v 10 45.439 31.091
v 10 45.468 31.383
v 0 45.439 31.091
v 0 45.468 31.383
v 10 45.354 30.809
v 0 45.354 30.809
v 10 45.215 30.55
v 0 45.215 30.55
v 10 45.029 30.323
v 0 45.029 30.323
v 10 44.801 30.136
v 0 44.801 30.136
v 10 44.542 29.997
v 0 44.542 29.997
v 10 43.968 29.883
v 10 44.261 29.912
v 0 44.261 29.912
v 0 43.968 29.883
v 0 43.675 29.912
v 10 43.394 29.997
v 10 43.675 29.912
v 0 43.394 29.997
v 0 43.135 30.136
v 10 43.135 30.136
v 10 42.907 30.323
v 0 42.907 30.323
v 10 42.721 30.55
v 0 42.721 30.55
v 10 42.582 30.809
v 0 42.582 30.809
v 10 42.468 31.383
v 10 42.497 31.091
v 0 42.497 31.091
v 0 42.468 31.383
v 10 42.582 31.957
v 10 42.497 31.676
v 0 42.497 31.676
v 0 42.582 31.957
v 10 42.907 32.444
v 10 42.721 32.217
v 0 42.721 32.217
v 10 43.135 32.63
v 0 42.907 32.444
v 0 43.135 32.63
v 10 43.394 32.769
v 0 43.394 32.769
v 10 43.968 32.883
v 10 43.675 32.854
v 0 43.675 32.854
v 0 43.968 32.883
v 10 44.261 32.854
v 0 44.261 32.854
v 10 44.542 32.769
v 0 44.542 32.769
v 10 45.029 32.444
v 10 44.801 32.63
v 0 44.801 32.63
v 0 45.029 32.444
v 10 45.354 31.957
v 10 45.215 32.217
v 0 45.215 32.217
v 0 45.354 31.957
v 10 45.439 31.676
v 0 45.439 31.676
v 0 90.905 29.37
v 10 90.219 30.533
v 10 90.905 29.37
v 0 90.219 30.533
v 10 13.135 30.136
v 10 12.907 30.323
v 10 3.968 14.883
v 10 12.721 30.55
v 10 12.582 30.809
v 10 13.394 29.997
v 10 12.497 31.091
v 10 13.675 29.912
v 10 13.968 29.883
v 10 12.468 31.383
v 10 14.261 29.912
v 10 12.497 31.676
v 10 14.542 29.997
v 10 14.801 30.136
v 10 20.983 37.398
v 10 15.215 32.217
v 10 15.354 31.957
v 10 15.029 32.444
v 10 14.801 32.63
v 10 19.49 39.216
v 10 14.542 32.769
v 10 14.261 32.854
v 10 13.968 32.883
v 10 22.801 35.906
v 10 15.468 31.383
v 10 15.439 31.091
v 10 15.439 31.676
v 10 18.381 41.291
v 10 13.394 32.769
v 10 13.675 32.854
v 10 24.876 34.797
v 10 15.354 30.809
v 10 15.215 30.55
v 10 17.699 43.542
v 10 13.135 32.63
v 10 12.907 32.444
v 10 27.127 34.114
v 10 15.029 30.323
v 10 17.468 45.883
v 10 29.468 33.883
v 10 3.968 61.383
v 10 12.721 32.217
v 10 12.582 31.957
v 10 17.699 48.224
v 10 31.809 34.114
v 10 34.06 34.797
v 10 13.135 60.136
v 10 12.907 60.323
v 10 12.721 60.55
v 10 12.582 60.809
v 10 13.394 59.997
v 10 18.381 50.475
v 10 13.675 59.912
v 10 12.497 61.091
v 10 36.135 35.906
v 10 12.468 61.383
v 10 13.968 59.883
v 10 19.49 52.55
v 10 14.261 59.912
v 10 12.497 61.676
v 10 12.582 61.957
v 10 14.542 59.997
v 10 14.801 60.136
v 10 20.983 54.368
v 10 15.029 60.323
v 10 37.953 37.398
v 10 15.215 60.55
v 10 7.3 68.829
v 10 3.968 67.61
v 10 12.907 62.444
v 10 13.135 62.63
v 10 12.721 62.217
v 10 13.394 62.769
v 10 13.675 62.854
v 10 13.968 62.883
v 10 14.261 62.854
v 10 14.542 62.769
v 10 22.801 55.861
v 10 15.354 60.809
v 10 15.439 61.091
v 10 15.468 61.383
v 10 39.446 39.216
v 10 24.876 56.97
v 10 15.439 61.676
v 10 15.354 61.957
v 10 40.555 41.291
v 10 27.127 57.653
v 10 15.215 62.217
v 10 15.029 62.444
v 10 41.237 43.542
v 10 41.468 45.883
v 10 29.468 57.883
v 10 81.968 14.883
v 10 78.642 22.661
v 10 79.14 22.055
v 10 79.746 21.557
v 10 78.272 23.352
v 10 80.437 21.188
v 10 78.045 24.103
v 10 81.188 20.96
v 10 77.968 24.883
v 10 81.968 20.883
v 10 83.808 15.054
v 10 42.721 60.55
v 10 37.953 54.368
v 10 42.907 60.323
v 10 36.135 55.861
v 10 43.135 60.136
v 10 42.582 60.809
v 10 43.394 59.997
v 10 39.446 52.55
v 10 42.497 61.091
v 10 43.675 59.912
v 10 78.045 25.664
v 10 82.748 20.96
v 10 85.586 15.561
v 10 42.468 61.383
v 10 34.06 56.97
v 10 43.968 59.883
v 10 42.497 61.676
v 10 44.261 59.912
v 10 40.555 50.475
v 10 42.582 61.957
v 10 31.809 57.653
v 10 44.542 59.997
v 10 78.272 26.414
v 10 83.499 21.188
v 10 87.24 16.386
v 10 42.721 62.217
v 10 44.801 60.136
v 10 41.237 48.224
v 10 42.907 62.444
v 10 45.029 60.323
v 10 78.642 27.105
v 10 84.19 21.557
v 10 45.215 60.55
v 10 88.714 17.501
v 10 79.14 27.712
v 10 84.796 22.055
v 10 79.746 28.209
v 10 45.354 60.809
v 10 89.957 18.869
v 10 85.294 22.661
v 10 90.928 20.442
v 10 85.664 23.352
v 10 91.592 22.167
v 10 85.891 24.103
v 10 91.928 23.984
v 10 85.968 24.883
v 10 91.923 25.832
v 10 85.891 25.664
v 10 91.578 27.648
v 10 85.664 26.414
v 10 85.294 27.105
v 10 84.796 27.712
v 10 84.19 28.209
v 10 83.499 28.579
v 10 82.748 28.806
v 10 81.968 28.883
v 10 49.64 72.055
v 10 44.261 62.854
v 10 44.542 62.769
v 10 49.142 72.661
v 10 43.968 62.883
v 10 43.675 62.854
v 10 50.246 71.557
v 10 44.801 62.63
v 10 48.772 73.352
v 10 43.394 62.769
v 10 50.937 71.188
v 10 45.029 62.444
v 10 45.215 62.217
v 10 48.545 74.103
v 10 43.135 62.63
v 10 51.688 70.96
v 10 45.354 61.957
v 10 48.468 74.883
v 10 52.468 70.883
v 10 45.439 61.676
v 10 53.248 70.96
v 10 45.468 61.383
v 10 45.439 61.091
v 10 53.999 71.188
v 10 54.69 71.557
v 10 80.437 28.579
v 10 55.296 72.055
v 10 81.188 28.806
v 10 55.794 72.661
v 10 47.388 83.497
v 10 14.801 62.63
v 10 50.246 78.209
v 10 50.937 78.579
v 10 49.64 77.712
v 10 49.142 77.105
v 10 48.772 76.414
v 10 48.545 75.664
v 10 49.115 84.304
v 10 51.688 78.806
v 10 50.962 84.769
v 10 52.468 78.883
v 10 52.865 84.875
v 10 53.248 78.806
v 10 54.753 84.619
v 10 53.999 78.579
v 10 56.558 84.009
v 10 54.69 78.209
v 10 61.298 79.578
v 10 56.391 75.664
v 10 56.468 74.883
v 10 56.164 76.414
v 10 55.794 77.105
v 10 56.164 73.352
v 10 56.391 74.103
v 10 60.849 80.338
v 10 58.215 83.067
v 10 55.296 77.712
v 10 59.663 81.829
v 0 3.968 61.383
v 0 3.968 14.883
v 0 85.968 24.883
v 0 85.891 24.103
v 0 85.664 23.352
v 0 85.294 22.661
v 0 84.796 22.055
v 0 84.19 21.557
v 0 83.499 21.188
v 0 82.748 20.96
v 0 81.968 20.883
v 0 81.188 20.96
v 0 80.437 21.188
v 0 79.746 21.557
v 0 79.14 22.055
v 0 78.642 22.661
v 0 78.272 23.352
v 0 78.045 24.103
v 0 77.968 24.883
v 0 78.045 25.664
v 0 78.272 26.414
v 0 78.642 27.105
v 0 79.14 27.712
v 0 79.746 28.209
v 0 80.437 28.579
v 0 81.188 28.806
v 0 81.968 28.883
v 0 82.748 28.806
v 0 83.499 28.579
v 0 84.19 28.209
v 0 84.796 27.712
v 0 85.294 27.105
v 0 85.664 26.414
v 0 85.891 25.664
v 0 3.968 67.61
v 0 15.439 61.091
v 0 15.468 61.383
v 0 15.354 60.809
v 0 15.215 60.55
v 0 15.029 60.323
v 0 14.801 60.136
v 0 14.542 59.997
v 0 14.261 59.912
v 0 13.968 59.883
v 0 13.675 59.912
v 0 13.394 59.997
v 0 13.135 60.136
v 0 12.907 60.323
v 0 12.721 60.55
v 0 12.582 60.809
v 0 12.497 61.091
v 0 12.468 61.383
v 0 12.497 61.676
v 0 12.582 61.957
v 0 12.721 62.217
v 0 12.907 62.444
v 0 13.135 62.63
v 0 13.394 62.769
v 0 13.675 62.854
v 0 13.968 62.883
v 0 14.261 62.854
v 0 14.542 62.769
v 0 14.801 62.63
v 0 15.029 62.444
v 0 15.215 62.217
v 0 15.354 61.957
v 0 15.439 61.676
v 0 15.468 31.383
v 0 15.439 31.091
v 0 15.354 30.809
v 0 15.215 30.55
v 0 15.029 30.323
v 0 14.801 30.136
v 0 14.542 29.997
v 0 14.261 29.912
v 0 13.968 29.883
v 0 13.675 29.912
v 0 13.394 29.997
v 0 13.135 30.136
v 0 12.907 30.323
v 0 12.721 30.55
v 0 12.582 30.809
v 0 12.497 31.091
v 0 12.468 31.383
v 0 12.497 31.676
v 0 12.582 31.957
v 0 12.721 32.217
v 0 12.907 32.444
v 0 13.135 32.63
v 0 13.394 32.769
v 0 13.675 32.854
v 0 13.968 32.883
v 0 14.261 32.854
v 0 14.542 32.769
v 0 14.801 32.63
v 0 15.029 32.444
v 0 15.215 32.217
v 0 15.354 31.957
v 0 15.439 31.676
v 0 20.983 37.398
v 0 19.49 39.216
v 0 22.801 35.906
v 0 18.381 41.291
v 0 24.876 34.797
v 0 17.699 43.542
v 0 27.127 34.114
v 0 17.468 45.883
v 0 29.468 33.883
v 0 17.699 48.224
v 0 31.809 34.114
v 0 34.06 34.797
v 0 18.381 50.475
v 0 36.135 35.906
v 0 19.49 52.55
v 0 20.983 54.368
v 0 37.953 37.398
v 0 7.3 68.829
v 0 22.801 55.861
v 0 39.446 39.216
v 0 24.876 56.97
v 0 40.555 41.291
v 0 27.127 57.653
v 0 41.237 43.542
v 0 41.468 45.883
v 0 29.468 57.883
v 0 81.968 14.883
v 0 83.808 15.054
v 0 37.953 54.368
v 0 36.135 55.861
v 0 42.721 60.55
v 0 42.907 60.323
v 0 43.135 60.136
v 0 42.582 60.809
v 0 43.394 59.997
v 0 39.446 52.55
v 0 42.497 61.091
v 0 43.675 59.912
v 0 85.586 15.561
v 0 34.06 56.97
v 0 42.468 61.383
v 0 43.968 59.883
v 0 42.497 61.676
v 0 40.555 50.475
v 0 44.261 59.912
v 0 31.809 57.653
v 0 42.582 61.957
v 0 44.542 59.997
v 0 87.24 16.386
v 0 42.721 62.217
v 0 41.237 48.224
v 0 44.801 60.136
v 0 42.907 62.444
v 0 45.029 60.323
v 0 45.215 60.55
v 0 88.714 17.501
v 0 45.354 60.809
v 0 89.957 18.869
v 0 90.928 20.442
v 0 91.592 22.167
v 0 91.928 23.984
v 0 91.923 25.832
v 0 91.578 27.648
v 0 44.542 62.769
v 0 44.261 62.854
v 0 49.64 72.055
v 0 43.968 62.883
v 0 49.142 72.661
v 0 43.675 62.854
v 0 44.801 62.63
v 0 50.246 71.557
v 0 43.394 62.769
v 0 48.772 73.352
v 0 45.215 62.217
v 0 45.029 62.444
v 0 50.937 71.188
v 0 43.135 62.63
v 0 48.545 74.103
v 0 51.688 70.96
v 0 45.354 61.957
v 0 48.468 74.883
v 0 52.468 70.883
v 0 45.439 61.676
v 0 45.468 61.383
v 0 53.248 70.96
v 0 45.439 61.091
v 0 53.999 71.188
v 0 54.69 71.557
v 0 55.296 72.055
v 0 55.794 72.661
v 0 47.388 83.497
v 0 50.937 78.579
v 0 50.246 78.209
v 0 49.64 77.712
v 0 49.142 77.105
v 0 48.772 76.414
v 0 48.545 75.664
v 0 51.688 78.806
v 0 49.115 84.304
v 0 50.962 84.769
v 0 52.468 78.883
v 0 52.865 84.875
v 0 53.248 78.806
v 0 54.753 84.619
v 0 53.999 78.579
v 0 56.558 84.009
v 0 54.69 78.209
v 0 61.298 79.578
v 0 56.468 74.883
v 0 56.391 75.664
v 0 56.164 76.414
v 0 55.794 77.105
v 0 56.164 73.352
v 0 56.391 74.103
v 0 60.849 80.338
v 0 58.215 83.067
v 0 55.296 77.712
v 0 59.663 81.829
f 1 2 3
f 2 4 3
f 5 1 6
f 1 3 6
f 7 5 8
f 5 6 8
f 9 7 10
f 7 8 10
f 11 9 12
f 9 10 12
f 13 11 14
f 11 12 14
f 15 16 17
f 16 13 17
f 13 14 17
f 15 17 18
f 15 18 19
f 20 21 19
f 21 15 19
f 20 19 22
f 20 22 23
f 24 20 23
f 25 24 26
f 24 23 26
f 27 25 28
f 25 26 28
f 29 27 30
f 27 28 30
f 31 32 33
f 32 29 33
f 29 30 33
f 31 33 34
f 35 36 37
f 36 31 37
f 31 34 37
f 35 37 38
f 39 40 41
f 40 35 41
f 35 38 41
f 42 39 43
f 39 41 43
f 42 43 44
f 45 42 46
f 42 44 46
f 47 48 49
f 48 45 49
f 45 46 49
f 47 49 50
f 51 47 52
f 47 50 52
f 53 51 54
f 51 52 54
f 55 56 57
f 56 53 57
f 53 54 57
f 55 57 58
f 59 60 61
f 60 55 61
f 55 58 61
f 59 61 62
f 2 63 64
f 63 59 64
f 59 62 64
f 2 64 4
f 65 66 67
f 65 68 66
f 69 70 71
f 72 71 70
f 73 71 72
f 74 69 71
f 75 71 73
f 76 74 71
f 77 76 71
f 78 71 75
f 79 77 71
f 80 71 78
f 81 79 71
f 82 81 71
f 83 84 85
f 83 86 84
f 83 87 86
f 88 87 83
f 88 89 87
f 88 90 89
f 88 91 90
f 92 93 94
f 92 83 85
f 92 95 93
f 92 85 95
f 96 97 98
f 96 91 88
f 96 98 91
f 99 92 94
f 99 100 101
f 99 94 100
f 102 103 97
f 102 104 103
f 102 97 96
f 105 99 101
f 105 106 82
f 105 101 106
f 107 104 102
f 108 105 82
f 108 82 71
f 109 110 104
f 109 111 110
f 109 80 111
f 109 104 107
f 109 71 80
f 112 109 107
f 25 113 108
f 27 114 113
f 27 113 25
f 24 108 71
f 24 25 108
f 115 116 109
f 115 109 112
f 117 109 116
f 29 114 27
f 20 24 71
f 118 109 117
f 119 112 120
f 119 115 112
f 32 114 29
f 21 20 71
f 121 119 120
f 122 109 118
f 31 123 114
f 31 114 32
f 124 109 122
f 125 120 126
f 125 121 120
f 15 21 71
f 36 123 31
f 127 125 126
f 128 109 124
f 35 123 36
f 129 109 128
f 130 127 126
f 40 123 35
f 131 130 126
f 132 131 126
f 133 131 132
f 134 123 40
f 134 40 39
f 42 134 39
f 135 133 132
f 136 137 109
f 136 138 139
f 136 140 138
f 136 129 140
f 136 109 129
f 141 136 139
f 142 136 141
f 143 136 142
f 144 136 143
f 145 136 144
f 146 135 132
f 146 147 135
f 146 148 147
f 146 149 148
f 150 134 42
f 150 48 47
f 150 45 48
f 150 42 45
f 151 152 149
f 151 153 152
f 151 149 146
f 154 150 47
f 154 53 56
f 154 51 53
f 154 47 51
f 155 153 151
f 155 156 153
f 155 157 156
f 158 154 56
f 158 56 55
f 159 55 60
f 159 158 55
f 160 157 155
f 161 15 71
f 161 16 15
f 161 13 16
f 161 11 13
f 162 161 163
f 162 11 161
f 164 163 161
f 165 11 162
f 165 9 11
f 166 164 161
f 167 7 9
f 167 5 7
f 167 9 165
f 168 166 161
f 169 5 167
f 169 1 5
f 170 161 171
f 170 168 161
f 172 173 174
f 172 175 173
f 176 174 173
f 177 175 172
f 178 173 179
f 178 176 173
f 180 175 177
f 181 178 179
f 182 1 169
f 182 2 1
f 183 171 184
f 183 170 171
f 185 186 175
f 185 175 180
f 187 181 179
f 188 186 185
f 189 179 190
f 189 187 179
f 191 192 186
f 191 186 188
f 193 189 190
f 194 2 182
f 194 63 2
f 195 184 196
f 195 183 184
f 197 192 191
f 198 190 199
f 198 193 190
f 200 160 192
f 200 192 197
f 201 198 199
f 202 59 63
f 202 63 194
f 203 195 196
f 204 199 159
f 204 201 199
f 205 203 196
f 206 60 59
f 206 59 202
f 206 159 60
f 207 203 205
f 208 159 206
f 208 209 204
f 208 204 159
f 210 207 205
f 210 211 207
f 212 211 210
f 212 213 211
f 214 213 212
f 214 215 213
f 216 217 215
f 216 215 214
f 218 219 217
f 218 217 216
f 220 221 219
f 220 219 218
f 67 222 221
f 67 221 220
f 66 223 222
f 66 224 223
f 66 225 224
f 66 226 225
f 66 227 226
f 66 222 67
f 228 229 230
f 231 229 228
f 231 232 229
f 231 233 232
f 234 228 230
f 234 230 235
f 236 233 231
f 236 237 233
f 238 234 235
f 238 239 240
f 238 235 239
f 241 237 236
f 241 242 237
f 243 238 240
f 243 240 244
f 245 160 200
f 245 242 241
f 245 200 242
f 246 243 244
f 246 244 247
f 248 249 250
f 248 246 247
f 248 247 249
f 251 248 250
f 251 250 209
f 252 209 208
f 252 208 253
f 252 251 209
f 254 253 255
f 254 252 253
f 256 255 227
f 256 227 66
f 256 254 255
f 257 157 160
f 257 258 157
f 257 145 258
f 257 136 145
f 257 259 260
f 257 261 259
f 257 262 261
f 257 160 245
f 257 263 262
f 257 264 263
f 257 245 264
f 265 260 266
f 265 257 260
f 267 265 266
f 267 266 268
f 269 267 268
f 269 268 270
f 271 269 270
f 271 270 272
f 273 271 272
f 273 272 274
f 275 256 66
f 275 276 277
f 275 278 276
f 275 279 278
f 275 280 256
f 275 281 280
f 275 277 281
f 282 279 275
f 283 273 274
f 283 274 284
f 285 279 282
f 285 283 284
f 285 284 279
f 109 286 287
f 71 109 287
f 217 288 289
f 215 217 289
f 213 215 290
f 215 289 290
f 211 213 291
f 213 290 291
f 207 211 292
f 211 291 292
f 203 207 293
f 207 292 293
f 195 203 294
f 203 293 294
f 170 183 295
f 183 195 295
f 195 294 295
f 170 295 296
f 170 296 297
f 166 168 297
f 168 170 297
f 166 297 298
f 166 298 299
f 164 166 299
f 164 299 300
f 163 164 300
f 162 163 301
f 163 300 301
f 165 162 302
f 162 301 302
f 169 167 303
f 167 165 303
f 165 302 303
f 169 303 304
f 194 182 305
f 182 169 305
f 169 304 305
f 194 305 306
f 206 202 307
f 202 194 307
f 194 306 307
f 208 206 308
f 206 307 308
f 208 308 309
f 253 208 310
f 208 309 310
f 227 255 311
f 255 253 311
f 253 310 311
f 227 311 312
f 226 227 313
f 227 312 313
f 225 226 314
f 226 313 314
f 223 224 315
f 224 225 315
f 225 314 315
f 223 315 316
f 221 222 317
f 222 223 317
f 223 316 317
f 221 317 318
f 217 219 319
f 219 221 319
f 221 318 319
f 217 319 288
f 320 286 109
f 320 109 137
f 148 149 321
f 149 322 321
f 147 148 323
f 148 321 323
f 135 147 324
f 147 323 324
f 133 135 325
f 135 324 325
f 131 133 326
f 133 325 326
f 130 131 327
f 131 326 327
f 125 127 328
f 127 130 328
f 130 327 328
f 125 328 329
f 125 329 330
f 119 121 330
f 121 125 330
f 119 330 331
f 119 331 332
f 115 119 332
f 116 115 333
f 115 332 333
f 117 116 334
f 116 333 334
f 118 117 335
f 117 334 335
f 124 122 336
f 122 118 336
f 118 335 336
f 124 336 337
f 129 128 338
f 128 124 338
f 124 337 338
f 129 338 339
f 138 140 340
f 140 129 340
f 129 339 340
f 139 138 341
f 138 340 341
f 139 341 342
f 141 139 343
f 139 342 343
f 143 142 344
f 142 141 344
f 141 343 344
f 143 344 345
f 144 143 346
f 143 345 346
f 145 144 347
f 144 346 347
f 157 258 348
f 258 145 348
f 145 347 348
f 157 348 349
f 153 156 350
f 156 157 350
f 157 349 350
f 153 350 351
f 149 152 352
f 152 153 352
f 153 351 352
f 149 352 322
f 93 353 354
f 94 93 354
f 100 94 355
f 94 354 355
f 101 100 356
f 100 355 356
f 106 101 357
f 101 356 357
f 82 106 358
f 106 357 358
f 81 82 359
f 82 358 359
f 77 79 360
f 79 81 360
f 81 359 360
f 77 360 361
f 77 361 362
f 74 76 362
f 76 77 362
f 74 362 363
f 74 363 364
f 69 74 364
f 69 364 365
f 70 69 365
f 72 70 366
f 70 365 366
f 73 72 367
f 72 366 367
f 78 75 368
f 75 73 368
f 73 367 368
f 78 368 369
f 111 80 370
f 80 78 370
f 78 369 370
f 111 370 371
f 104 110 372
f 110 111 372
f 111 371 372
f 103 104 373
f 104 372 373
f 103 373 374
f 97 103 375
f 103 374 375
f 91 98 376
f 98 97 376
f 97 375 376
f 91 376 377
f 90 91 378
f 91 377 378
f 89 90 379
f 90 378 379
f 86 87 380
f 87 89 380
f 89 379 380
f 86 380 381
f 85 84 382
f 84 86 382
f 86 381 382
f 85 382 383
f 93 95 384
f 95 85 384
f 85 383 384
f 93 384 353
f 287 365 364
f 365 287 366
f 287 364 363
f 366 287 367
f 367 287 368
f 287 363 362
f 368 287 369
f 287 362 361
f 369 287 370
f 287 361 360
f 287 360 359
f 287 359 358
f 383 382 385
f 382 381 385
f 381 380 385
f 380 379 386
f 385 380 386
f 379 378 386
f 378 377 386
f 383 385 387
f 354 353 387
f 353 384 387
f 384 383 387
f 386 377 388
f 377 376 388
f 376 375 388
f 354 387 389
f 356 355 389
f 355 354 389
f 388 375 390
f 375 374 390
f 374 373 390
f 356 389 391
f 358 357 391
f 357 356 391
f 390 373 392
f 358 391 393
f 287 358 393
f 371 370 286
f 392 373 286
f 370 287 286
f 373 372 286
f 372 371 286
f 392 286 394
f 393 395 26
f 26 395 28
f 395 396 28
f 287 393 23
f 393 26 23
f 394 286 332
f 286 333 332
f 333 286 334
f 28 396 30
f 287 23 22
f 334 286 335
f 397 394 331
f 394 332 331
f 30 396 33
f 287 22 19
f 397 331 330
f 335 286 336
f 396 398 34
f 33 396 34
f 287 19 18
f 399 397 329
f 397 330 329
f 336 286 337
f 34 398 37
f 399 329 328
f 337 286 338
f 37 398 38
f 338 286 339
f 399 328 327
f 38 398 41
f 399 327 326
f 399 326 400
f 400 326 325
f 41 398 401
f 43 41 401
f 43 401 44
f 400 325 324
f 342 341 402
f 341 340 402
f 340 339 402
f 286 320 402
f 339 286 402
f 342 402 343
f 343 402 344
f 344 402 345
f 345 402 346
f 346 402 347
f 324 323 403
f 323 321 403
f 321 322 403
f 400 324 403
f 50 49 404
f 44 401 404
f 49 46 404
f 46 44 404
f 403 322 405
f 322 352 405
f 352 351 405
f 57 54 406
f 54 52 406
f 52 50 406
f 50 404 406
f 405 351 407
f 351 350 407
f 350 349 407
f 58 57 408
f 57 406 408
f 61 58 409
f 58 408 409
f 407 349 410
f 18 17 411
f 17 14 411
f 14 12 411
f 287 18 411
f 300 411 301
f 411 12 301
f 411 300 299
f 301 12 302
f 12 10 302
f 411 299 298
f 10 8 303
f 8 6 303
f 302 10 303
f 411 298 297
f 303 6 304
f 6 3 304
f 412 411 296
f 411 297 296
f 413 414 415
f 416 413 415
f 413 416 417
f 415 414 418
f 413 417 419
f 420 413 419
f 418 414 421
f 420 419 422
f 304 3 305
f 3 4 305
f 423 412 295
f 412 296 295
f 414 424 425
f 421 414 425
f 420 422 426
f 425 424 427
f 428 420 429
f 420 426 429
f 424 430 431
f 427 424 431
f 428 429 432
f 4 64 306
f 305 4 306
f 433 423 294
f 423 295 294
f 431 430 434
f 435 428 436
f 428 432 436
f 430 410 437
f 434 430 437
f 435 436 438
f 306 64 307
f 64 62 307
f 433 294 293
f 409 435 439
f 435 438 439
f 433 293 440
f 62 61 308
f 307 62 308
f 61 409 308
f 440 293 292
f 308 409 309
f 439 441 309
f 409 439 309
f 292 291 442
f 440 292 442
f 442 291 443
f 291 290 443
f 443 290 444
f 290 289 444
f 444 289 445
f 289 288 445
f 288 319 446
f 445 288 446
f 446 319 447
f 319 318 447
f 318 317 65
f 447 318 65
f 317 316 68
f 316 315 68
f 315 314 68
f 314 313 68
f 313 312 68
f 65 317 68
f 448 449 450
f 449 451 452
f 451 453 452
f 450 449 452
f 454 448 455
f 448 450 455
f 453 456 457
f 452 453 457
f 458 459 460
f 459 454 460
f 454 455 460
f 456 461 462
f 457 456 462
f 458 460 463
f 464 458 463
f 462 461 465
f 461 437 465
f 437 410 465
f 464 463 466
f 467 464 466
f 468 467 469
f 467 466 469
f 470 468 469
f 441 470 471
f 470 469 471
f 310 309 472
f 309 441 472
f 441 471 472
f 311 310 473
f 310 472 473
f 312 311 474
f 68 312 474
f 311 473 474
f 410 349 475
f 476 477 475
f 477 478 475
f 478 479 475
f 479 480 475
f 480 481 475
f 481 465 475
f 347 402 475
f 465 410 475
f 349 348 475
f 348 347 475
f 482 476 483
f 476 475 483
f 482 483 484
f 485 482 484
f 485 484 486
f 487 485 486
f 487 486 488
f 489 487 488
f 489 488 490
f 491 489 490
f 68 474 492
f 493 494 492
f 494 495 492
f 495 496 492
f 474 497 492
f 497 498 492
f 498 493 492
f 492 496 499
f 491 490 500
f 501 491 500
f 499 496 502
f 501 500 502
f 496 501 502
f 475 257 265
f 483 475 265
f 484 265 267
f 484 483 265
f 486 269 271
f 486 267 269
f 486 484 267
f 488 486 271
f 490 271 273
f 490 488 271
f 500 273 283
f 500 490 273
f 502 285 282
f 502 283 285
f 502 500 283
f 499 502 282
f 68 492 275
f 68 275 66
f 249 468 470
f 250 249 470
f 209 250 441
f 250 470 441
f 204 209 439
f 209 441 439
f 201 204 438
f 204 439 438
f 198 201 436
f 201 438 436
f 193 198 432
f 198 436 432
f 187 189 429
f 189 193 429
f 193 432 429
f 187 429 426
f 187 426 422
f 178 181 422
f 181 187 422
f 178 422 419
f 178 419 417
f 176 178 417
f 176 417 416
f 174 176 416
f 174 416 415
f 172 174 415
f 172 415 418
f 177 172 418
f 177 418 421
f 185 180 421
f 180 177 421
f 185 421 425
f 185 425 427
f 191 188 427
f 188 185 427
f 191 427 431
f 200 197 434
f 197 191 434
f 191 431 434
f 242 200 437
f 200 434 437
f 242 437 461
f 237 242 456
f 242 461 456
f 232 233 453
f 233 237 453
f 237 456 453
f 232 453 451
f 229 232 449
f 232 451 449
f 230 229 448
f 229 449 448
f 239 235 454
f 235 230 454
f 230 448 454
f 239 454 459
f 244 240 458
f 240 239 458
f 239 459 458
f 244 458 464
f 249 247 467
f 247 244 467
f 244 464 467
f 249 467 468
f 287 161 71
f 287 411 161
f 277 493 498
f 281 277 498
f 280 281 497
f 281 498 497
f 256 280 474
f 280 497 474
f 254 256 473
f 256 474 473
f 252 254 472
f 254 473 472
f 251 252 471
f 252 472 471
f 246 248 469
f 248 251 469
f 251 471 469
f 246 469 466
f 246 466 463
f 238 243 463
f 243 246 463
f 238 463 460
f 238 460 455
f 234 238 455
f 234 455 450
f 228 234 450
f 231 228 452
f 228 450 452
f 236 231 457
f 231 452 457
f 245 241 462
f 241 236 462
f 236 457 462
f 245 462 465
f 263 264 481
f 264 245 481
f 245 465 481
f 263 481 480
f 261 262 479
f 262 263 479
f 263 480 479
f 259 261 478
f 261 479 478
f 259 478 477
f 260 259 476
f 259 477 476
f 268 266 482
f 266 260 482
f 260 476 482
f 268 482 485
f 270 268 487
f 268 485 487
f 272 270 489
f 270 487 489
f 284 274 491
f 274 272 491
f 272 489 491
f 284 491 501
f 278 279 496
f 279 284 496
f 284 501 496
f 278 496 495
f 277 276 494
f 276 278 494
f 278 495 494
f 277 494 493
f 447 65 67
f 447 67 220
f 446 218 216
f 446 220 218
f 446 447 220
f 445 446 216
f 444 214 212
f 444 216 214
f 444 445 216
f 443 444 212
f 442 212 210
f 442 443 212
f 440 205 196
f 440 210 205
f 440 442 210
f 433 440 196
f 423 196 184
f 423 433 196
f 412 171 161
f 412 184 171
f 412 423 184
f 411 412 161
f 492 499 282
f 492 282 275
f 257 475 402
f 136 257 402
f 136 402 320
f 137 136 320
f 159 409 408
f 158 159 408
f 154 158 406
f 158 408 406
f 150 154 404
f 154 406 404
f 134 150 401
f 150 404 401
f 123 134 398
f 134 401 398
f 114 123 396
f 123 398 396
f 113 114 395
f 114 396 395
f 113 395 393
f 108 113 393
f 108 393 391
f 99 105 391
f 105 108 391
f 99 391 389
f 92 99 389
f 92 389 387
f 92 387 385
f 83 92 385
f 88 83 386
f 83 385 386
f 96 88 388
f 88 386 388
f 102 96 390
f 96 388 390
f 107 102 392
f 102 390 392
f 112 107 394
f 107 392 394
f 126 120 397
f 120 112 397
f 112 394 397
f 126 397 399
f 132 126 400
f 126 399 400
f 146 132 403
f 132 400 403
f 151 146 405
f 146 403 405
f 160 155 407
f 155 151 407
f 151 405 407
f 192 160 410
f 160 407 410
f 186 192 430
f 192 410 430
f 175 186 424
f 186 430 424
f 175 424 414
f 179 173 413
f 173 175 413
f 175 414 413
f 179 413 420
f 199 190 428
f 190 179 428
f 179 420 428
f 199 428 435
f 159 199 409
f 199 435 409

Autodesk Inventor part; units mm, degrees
ref_plane "YZ Plane" through (0, 0, 0) normal (1, 0, 0) x (0, 1, 0)
ref_plane "XZ Plane" through (0, 0, 0) normal (0, 1, 0) x (-1, 0, 0)
ref_plane "XY Plane" through (0, 0, 0) normal (0, 0, 1) x (1, 0, 0)
sketch "Sketch1" plane through (0, 0, 0) normal (1, 0, 0) x (0, 1, 0)
  circle A0 centre (52.468, 74.8832) radius 4
  circle A1 centre (81.968, 24.8832) radius 4
  circle A2 centre (29.468, 45.8832) radius 12
  circle A3 centre (13.968, 61.3832) radius 1.5
  circle A4 centre (43.968, 61.3832) radius 1.5
  circle A5 centre (43.968, 31.3832) radius 1.5
  circle A6 centre (13.968, 31.3832) radius 1.5
  arc A7 (61.2976, 79.5777) -> (47.3885, 83.497) centre (52.468, 74.8832) ccw
  arc A8 (81.968, 14.8832) -> (90.2193, 30.5327) centre (81.968, 24.8832) ccw
  line L0 (60.8493, 80.3379) -> (90.9051, 29.3697)
  line L1 (47.3885, 83.497) -> (7.3003, 68.8293)
  line L2 (3.968, 61.3832) -> (3.968, 67.6101)
  line L3 (7.3003, 68.8293) -> (3.968, 67.6101)
  line L4 (3.968, 61.3832) -> (3.968, 14.8832)
  line L5 (81.968, 14.8832) -> (3.968, 14.8832)
  point P0 (0, 0)
extrude "Extrusion1" add sketch "Sketch1" along normal blind 10 contours L0 A8 L5 L4 L2 L3 L1 A7
properties part number "Y_MotorMount" material "Birch"
